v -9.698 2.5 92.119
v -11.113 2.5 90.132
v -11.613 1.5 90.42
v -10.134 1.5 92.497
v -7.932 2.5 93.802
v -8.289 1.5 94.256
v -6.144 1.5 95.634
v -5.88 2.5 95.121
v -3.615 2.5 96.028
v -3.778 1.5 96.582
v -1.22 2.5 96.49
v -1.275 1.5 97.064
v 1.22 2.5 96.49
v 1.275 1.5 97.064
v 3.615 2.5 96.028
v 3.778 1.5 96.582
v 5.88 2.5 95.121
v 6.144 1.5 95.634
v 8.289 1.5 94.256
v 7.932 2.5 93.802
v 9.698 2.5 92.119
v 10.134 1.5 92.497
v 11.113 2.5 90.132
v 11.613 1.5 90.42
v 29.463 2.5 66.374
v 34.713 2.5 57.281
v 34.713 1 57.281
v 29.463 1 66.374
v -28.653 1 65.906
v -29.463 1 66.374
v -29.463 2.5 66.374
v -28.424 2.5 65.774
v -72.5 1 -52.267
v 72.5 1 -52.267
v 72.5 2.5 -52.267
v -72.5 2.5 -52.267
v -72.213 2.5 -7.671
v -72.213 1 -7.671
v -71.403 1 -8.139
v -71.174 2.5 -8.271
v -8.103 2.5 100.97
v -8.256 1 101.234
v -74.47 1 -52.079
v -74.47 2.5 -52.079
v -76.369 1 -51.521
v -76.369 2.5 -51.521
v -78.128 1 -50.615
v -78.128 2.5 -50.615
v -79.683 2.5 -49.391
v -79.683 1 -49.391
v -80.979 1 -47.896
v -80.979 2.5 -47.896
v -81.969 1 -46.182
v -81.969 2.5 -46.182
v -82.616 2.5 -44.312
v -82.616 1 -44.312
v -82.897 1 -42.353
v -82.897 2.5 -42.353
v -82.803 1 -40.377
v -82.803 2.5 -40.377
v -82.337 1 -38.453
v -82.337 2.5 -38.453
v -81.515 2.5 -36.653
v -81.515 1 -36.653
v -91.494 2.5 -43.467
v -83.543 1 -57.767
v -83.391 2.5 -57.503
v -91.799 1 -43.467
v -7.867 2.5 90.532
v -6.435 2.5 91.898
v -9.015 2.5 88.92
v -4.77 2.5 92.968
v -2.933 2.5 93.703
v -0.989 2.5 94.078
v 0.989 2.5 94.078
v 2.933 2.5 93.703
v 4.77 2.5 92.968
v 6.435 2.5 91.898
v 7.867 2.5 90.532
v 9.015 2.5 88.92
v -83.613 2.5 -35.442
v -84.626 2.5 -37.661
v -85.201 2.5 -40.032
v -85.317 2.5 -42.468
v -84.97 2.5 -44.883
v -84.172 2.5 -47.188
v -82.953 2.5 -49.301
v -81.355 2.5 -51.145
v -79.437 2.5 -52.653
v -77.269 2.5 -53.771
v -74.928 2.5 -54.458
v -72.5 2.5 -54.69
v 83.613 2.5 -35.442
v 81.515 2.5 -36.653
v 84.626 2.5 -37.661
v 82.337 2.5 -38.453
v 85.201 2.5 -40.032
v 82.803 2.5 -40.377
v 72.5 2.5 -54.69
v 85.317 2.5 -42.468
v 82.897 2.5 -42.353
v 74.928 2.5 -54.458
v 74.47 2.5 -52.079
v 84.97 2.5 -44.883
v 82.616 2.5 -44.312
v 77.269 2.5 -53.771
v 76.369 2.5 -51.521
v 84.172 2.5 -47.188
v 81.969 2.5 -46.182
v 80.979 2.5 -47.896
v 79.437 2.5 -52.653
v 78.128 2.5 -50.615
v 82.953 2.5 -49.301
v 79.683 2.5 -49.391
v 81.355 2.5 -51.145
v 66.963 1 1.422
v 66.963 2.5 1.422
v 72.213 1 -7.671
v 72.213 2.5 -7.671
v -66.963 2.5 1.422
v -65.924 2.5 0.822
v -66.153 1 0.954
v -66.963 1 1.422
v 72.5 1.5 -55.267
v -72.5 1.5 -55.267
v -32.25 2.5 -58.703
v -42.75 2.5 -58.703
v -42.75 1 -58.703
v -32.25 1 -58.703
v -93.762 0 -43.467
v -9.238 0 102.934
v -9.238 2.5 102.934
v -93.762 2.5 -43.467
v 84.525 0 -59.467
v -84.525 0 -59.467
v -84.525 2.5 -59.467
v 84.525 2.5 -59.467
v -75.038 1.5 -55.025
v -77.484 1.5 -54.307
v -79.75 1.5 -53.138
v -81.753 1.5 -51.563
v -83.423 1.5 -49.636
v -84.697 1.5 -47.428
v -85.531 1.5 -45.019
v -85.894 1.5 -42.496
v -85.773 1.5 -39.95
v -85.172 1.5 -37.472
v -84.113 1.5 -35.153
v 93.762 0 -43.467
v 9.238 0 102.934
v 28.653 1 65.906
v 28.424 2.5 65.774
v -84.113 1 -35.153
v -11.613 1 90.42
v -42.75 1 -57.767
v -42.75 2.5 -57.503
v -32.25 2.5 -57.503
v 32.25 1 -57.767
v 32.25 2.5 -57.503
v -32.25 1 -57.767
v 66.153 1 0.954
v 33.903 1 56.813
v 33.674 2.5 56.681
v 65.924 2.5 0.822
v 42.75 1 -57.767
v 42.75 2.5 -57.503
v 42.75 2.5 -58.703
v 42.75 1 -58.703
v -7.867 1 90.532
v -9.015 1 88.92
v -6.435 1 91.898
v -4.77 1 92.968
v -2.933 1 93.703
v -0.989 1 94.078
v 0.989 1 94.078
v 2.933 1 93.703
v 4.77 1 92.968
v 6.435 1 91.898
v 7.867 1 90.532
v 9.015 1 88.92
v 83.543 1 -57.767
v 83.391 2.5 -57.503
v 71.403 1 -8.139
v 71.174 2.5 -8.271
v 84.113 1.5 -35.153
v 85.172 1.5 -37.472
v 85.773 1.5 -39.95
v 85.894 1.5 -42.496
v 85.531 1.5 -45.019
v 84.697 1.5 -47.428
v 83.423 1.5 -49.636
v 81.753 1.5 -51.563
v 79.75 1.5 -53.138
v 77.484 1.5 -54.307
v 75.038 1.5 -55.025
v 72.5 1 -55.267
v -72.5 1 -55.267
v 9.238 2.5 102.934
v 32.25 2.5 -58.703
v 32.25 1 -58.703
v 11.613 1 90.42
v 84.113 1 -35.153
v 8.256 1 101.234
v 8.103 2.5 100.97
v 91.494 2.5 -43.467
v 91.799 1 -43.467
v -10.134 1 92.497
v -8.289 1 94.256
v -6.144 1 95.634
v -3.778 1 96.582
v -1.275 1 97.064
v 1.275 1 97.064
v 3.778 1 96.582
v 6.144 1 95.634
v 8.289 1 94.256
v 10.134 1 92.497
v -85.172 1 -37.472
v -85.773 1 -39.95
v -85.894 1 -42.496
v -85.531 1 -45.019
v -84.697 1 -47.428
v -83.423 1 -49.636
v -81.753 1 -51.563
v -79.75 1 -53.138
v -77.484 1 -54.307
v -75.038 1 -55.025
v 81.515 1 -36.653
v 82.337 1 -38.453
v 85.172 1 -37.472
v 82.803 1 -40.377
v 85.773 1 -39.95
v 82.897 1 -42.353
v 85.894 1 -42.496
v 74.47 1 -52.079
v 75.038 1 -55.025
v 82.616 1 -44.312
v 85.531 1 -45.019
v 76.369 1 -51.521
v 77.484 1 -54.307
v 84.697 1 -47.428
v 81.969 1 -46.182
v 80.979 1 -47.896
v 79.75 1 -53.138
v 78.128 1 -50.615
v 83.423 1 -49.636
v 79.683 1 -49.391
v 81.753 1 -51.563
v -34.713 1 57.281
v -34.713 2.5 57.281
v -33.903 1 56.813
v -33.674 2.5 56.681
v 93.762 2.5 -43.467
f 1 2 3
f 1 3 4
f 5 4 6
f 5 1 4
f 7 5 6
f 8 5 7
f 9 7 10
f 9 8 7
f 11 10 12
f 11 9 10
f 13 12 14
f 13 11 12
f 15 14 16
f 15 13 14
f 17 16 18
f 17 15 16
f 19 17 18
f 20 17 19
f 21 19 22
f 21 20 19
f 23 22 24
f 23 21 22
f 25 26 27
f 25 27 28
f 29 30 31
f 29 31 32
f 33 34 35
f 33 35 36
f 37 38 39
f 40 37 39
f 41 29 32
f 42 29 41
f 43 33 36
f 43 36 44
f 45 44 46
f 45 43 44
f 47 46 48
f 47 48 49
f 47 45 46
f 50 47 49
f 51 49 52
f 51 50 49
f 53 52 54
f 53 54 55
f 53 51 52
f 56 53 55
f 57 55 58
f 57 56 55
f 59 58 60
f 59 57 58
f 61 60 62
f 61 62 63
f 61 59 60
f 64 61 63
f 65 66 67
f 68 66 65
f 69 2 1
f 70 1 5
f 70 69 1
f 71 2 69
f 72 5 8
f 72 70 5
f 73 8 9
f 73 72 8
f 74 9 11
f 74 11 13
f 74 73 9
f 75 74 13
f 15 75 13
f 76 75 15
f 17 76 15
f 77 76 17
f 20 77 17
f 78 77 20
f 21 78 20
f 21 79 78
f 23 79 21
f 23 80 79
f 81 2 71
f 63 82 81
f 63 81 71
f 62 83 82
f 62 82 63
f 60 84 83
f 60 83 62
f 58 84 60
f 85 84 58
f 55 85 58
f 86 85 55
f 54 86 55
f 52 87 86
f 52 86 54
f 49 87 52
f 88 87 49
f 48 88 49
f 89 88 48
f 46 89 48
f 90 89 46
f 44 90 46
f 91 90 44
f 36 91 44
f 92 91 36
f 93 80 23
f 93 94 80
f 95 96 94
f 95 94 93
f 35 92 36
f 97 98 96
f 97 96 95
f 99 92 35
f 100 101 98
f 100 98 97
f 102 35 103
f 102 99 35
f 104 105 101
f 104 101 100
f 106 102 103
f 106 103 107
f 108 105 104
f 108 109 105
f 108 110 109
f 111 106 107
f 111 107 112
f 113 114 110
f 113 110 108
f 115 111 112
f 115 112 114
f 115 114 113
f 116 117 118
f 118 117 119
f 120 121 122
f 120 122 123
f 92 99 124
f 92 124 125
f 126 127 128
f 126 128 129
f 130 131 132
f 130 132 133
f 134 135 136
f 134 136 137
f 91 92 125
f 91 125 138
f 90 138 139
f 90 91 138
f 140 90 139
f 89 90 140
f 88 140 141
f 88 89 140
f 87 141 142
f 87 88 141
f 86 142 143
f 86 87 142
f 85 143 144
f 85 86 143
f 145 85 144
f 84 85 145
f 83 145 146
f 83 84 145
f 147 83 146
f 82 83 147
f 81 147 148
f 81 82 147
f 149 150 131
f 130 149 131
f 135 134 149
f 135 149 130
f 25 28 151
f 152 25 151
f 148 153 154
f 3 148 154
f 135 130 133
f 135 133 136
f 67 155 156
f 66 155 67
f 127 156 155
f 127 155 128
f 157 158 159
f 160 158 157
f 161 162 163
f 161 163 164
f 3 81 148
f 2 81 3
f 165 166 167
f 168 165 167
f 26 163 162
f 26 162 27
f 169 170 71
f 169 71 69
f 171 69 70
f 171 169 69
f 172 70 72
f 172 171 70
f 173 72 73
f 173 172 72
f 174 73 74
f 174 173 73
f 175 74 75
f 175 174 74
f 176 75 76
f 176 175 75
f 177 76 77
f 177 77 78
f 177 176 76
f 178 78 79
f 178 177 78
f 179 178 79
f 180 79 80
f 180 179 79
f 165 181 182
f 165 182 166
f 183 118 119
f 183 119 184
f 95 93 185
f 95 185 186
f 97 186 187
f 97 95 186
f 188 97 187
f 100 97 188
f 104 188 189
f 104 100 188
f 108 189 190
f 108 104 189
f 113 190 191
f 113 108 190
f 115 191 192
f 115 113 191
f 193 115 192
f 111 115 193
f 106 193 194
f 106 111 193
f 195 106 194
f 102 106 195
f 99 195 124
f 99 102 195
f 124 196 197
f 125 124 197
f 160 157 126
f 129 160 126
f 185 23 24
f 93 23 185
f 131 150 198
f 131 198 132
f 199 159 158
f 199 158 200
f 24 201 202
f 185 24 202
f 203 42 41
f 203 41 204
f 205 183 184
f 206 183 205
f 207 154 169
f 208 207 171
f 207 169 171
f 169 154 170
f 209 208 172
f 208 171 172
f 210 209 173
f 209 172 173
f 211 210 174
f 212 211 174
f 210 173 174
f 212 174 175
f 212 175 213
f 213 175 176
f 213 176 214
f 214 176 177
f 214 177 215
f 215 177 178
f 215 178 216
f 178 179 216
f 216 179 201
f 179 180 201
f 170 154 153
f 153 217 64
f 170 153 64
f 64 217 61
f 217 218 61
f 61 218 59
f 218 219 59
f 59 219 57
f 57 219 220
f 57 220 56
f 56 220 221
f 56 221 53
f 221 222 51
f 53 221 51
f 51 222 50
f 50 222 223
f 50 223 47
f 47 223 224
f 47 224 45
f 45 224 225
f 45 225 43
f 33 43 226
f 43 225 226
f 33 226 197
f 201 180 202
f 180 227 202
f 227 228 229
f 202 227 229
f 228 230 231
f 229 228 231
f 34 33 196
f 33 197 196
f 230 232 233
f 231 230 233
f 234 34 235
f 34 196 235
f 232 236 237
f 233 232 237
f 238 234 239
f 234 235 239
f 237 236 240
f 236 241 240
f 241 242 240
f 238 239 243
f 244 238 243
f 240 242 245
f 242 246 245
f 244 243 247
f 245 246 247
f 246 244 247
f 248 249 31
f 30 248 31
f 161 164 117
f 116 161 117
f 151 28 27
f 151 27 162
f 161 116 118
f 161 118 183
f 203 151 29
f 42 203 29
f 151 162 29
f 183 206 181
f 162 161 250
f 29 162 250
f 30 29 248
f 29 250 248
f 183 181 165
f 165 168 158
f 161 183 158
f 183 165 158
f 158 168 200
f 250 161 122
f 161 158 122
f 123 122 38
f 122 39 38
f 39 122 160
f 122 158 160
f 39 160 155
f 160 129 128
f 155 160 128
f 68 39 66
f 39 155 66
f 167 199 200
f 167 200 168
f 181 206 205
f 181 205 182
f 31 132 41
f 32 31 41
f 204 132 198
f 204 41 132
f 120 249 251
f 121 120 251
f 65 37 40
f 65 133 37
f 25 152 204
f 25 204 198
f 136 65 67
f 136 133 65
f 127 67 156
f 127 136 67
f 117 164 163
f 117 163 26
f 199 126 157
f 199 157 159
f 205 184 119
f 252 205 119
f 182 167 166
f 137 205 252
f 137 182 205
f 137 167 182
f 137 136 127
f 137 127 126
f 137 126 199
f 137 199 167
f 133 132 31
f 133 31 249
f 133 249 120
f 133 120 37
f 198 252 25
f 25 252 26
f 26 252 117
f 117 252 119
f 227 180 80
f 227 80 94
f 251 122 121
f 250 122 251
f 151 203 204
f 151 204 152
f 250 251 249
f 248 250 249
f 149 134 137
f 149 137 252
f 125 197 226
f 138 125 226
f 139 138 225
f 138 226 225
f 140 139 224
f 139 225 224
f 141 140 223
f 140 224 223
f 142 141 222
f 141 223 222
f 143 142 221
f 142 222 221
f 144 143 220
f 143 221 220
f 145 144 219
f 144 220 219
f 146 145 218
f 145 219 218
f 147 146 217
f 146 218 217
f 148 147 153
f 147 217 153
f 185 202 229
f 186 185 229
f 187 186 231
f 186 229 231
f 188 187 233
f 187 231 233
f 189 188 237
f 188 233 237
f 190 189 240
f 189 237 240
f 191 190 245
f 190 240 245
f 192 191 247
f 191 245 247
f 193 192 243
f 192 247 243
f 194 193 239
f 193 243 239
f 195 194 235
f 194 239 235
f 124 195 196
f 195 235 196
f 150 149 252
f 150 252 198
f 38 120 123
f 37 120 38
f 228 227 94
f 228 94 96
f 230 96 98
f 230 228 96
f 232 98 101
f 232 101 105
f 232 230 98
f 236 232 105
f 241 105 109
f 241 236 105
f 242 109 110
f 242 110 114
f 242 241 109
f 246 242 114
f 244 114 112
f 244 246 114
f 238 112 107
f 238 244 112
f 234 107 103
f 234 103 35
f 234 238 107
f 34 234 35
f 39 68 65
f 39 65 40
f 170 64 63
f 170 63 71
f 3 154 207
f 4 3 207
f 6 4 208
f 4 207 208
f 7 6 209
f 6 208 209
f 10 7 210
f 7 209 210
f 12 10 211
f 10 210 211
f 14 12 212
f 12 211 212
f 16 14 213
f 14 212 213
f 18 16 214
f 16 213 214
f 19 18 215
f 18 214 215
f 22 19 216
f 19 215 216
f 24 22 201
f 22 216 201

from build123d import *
from OCP.BRepFilletAPI import BRepFilletAPI_MakeChamfer

# Parameters (mm, degrees)
SMARTLEAF_TRIANGLE_MULTI_DEPTH  = 1
EXTRU_MINCE1_DEPTH              = 1.5
EXTRU_MINCE1_DRAFT              = -10
ENL_V_DE_MAT_EXTRU_MINCE1_DEPTH = 140.660166399
ESQUISSE10_W                    = 10.5
ESQUISSE10_H                    = 19.000079823
ENL_V_MAT_EXTRU_1_DEPTH         = 1.5
EXTRU_MINCE2_DEPTH              = 1.5
CHANFREIN1_SIZE                 = 1
CHANFREIN1_SIZE2                = 0.577350269


with BuildPart() as part:
    # Esquisse2 → smartleaf_triangle_multi (new body)
    with BuildSketch(Plane(origin=(0, 0, 0), x_dir=(1, 0, 0), z_dir=(0, 1, 0))):
        Polygon((-93.762395693, 43.467077727), (-84.524791386, 59.467077727), (84.524791386, 59.467077727), (93.762395693, 43.467077727), (9.237604307, -102.934155453), (-9.237604307, -102.934155453), align=None)
    extrude(amount=SMARTLEAF_TRIANGLE_MULTI_DEPTH)


with BuildPart() as extru_mince1_tool:
    # Esquisse5 → Extru.-Mince1 (with draft: the straight prism first)
    with BuildSketch(Plane(origin=(0, 1, 0), x_dir=(1, 0, 0), z_dir=(0, 1, 0))):
        Polygon((-93.762395693, 43.467077727), (-9.237604307, -102.934155453), (9.237604307, -102.934155453), (93.762395693, 43.467077727), (84.524791386, 59.467077727), (-84.524791386, 59.467077727), align=None)
        Polygon((-91.799404778, 43.467077727), (-8.256108849, -101.234155453), (8.256108849, -101.234155453), (91.799404778, 43.467077727), (83.543295928, 57.767077727), (-83.543295928, 57.767077727), align=None, mode=Mode.SUBTRACT)
    extrude(amount=EXTRU_MINCE1_DEPTH)
    # Extru.-Mince1: the draft: its side faces are tilted about the plane it starts from
    extru_mince1_sides = [extru_mince1_tool.faces().sort_by_distance(p)[0] for p in [
        (-51.5, 1.75, 29.733538863),
        (0, 1.75, 102.934155453),
        (51.5, 1.75, 29.733538863),
        (89.143593539, 1.75, -51.467077727),
        (0, 1.75, -59.467077727),
        (-89.143593539, 1.75, -51.467077727),
        (-87.671350353, 1.75, -50.617077727),
        (0, 1.75, -57.767077727),
        (87.671350353, 1.75, -50.617077727),
        (50.027756814, 1.75, 28.883538863),
        (0, 1.75, 101.234155453),
        (-50.027756814, 1.75, 28.883538863),
    ]]
    draft(extru_mince1_sides, Plane(origin=(0, 1, 0), x_dir=(1, 0, 0), z_dir=(0, 1, 0)), EXTRU_MINCE1_DRAFT)


with BuildPart() as part_1:
    add(part.part)

    # Extru.-Mince1: add extru_mince1_tool
    add(extru_mince1_tool.part)

    # Esquisse6 → Enlèv. de mat.-Extru.-Mince1 (cut, through all)
    with BuildSketch(Plane.XZ):
        Polygon((-85.39081679, -60.967077727), (85.39081679, -60.967077727), (95.494446501, -43.467077727), (10.103629711, 104.434155453), (-10.103629711, 104.434155453), (-95.494446501, -43.467077727), align=None)
        Polygon((-84.524791386, -59.467077727), (84.524791386, -59.467077727), (93.762395693, -43.467077727), (9.237604307, 102.934155453), (-9.237604307, 102.934155453), (-93.762395693, -43.467077727), align=None, mode=Mode.SUBTRACT)
    extrude(amount=-ENL_V_DE_MAT_EXTRU_MINCE1_DEPTH, mode=Mode.SUBTRACT)

    # Esquisse10 → Enlèv. mat.-Extru.1 (cut)
    with BuildSketch(Plane(origin=(0, 2.5, 0), x_dir=(1, 0, 0), z_dir=(0, 1, 0))):
        with Locations((-37.5, 49.202547344)):
            Rectangle(ESQUISSE10_W, ESQUISSE10_H)
        with Locations((37.5, 49.202547344)):
            Rectangle(ESQUISSE10_W, ESQUISSE10_H)
        Polygon((66.962931831, -1.421974356), (72.212931831, 7.671292384), (55.75838003, 17.171332296), (50.50838003, 8.078065556), align=None)
        Polygon((29.462931831, -66.37387964), (13.00838003, -56.873839728), (18.25838003, -47.780572988), (34.712931831, -57.2806129), align=None)
        Polygon((-34.712931831, -57.2806129), (-29.462931831, -66.37387964), (-13.00838003, -56.873839728), (-18.25838003, -47.780572988), align=None)
        Polygon((-72.212931831, 7.671292384), (-55.75838003, 17.171332296), (-50.50838003, 8.078065556), (-66.962931831, -1.421974356), align=None)
    extrude(amount=-ENL_V_MAT_EXTRU_1_DEPTH, mode=Mode.SUBTRACT)


with BuildPart() as body_2:
    # Esquisse11 → Extru.-Mince2 (new body)
    with BuildSketch(Plane(origin=(0, 1, 0), x_dir=(1, 0, 0), z_dir=(0, 1, 0))):
        with BuildLine():
            Line((-84.112693304, 35.153302911), (-11.612693304, -90.420380638))
            ThreePointArc((-11.612693304, -90.420380638), (0, -97.124972243), (11.612693304, -90.420380638))
            Line((11.612693304, -90.420380638), (84.112693304, 35.153302911))
            ThreePointArc((84.112693304, 35.153302911), (84.112693304, 48.562486121), (72.5, 55.267077727))
            Line((72.5, 55.267077727), (-72.5, 55.267077727))
            ThreePointArc((-72.5, 55.267077727), (-84.112693304, 48.562486121), (-84.112693304, 35.153302911))
        make_face()
        with BuildLine():
            Line((-81.514617093, 36.653302911), (-9.014617093, -88.920380638))
            ThreePointArc((-9.014617093, -88.920380638), (0, -94.124972243), (9.014617093, -88.920380638))
            Line((9.014617093, -88.920380638), (81.514617093, 36.653302911))
            ThreePointArc((81.514617093, 36.653302911), (81.514617093, 47.062486121), (72.5, 52.267077727))
            Line((72.5, 52.267077727), (-72.5, 52.267077727))
            ThreePointArc((-72.5, 52.267077727), (-81.514617093, 47.062486121), (-81.514617093, 36.653302911))
        make_face(mode=Mode.SUBTRACT)
    extrude(amount=EXTRU_MINCE2_DEPTH)

    # Chanfrein1: one chamfer whose edges measure the first distance from different faces: ONE call of the kernel's chamfer builder (chamfer() names one face for all edges)
    chanfrein1_edges_1 = [body_2.edges().sort_by_distance(p)[0] for p in [
        (47.862693304, 2.5, 27.633538863),
    ]]
    chanfrein1_side_1 = [body_2.faces().sort_by_distance(p)[0] for p in [
        (47.862693304, 1.75, 27.633538863),
    ]]
    chanfrein1_edges_2 = [body_2.edges().sort_by_distance(p)[0] for p in [
        (84.112693304, 2.5, -48.562486121),
    ]]
    chanfrein1_side_2 = [body_2.faces().sort_by_distance(p)[0] for p in [
        (84.112693304, 1.75, -48.562486121),
    ]]
    chanfrein1_edges_3 = [body_2.edges().sort_by_distance(p)[0] for p in [
        (0, 2.5, -55.267077727),
    ]]
    chanfrein1_side_3 = [body_2.faces().sort_by_distance(p)[0] for p in [
        (0, 1.75, -55.267077727),
    ]]
    chanfrein1_edges_4 = [body_2.edges().sort_by_distance(p)[0] for p in [
        (-84.112693304, 2.5, -48.562486121),
    ]]
    chanfrein1_side_4 = [body_2.faces().sort_by_distance(p)[0] for p in [
        (-84.112693304, 1.75, -48.562486121),
    ]]
    chanfrein1_edges_5 = [body_2.edges().sort_by_distance(p)[0] for p in [
        (-47.862693304, 2.5, 27.633538863),
    ]]
    chanfrein1_side_5 = [body_2.faces().sort_by_distance(p)[0] for p in [
        (-47.862693304, 1.75, 27.633538863),
    ]]
    chanfrein1_edges_6 = [body_2.edges().sort_by_distance(p)[0] for p in [
        (0, 2.5, 97.124972243),
    ]]
    chanfrein1_side_6 = [body_2.faces().sort_by_distance(p)[0] for p in [
        (0, 1.75, 97.124972243),
    ]]
    chanfrein1 = BRepFilletAPI_MakeChamfer(body_2.part.solid().wrapped)
    for e in chanfrein1_edges_1:
        chanfrein1.Add(CHANFREIN1_SIZE, CHANFREIN1_SIZE2, e.wrapped, chanfrein1_side_1[0].wrapped)  # the first distance lies on this face
    for e in chanfrein1_edges_2:
        chanfrein1.Add(CHANFREIN1_SIZE, CHANFREIN1_SIZE2, e.wrapped, chanfrein1_side_2[0].wrapped)  # the first distance lies on this face
    for e in chanfrein1_edges_3:
        chanfrein1.Add(CHANFREIN1_SIZE, CHANFREIN1_SIZE2, e.wrapped, chanfrein1_side_3[0].wrapped)  # the first distance lies on this face
    for e in chanfrein1_edges_4:
        chanfrein1.Add(CHANFREIN1_SIZE, CHANFREIN1_SIZE2, e.wrapped, chanfrein1_side_4[0].wrapped)  # the first distance lies on this face
    for e in chanfrein1_edges_5:
        chanfrein1.Add(CHANFREIN1_SIZE, CHANFREIN1_SIZE2, e.wrapped, chanfrein1_side_5[0].wrapped)  # the first distance lies on this face
    for e in chanfrein1_edges_6:
        chanfrein1.Add(CHANFREIN1_SIZE, CHANFREIN1_SIZE2, e.wrapped, chanfrein1_side_6[0].wrapped)  # the first distance lies on this face
    add(Compound.cast(chanfrein1.Shape()), mode=Mode.REPLACE)


solid = Compound([part_1.part, body_2.part])
